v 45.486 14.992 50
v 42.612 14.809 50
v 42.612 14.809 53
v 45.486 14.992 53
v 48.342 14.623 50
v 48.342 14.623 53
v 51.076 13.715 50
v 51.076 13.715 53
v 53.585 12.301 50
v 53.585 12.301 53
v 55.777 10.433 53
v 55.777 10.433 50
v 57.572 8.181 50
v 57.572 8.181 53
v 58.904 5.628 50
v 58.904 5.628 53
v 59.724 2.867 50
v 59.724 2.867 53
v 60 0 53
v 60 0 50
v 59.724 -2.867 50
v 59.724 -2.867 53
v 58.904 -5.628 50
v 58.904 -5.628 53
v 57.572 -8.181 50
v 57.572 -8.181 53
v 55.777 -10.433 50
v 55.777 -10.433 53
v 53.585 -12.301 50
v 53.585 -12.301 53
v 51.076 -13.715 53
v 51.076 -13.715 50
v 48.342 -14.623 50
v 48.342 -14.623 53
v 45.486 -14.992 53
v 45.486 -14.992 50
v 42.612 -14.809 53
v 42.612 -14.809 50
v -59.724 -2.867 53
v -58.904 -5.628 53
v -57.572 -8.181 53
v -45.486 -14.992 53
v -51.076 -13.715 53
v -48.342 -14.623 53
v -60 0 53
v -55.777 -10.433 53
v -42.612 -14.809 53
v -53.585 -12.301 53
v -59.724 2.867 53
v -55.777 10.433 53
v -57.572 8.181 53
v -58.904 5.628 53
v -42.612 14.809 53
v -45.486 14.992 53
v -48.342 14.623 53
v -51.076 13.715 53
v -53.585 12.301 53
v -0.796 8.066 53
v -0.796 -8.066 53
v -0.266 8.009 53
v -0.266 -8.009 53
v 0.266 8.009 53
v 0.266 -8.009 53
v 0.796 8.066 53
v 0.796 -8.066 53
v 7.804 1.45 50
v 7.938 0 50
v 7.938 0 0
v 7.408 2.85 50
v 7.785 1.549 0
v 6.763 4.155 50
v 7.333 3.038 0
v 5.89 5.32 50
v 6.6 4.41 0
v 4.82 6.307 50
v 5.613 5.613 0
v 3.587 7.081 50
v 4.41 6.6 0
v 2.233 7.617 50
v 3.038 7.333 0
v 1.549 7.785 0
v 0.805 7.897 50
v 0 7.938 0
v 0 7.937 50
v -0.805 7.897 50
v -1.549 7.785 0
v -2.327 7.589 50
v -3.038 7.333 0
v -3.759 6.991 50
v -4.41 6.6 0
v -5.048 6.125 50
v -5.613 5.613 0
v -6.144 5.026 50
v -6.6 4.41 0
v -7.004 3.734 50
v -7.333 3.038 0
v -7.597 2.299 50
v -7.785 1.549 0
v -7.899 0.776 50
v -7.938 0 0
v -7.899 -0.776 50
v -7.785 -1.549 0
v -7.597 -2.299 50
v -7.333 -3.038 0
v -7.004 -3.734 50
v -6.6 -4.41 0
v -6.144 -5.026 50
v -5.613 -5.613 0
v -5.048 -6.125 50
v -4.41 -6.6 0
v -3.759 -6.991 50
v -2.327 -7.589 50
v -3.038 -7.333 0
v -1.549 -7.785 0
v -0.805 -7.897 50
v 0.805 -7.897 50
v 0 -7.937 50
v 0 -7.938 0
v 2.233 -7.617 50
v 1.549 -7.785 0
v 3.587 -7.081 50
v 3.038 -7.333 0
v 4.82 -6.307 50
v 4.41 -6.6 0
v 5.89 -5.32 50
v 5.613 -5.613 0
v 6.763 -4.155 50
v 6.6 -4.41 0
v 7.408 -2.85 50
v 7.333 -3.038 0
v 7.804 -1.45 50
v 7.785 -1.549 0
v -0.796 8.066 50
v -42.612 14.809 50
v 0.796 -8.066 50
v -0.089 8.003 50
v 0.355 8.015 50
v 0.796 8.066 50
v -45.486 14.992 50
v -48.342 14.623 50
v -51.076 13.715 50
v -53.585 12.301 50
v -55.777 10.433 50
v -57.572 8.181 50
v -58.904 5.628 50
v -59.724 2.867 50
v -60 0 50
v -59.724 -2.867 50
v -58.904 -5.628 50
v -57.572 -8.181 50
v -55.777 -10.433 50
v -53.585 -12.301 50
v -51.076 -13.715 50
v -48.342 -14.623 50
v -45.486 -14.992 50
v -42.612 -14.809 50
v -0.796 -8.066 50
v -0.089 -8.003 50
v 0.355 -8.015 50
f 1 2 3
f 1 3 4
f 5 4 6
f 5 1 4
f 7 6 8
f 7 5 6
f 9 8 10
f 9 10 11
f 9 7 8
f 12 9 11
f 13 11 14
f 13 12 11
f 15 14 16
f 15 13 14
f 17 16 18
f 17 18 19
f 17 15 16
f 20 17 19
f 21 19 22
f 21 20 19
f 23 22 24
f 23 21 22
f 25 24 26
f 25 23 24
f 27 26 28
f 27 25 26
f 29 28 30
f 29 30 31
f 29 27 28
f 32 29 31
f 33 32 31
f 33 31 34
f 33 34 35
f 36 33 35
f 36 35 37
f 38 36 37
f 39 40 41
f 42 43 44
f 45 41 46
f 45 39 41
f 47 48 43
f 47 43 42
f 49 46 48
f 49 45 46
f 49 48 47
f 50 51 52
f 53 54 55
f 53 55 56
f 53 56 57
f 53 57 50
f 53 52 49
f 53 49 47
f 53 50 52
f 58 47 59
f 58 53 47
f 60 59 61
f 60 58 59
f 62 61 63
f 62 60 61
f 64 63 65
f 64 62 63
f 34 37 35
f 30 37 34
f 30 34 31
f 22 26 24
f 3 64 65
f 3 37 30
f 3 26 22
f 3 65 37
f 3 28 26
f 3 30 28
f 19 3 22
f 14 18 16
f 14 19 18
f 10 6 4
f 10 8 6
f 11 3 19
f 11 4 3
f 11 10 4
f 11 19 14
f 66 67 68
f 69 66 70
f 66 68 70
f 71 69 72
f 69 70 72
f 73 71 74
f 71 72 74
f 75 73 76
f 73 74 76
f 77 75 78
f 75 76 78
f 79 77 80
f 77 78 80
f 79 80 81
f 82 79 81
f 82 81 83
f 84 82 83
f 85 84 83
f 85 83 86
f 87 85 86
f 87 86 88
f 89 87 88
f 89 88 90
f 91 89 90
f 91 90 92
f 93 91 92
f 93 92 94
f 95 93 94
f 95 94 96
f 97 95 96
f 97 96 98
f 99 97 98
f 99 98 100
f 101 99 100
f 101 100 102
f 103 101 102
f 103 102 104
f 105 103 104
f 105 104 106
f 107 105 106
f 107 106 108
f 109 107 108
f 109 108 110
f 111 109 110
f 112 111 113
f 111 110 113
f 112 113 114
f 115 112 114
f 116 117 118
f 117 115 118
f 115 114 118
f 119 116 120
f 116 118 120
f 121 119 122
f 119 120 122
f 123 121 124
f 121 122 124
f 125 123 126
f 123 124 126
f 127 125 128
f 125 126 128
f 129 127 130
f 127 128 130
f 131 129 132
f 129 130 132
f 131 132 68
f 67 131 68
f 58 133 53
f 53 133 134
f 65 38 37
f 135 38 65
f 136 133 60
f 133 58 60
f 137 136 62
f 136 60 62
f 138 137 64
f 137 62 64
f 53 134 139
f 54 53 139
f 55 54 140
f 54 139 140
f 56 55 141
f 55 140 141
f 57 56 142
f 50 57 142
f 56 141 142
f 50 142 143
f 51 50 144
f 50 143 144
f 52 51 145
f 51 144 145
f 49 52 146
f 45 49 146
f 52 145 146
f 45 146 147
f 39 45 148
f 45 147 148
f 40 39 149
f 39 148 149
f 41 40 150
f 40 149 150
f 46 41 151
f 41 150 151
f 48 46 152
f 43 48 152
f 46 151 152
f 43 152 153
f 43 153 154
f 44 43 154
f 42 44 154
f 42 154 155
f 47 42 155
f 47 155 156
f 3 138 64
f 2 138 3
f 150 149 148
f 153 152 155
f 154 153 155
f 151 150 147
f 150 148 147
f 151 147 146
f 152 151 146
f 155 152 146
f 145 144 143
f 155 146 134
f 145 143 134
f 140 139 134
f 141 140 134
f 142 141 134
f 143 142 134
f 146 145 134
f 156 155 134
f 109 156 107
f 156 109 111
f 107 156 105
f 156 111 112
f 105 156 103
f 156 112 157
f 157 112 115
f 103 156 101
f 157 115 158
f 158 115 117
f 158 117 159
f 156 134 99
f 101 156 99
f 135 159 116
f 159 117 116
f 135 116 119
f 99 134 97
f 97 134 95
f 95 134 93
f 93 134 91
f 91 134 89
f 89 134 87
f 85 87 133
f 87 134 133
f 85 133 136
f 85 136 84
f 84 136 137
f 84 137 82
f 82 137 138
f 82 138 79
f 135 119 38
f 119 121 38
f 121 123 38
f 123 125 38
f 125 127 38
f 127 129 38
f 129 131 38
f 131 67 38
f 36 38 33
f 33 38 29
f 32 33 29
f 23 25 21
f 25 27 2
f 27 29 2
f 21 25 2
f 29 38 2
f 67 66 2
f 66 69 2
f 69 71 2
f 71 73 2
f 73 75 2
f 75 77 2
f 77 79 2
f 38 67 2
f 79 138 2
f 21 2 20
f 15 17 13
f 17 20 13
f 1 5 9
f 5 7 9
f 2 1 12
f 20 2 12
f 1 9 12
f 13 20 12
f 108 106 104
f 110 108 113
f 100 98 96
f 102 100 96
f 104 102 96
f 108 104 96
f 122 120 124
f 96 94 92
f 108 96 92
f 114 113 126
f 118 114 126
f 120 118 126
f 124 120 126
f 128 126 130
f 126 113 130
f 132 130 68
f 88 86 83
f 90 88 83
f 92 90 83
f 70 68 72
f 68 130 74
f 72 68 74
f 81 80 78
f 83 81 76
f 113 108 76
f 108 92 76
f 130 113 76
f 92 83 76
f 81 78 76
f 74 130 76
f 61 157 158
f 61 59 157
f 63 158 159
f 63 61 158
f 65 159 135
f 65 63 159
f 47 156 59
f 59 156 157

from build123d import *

# Parameters (mm, degrees)
SKETCH1_R           = 7.9375
BOSS_EXTRUDE1_DEPTH = 50
BOSS_EXTRUDE2_DEPTH = 3
FILLET1_R           = 5


with BuildPart() as part:
    # Sketch1 → Boss-Extrude1 (new body)
    with BuildSketch(Plane.XY):
        Circle(SKETCH1_R)
    extrude(amount=BOSS_EXTRUDE1_DEPTH)

    # Sketch2 → Boss-Extrude2 (add)
    with BuildSketch(Plane.XY.offset(50)):
        with BuildLine():
            Line((0, -7.9375), (0, 7.9375))
            Line((0, 7.9375), (42.612091922, 14.808710106))
            ThreePointArc((42.612091922, 14.808710106), (60, 0), (42.612091922, -14.808710106))
            Line((42.612091922, -14.808710106), (0, -7.9375))
        make_face()
    boss_extrude2 = extrude(amount=BOSS_EXTRUDE2_DEPTH)

    # Mirror1: Boss-Extrude2 across plane
    add(boss_extrude2.mirror(Plane(origin=(0, -7.9375, 53), x_dir=(0, 0, 1), z_dir=(1, 0, 0))))

    # Fillet1
    fillet1_edges = [part.edges().sort_by_distance(p)[0] for p in [
        (0, 7.9375, 51.5),
        (0, -7.9375, 51.5),
    ]]
    fillet(fillet1_edges, radius=FILLET1_R)


solid = part.part
